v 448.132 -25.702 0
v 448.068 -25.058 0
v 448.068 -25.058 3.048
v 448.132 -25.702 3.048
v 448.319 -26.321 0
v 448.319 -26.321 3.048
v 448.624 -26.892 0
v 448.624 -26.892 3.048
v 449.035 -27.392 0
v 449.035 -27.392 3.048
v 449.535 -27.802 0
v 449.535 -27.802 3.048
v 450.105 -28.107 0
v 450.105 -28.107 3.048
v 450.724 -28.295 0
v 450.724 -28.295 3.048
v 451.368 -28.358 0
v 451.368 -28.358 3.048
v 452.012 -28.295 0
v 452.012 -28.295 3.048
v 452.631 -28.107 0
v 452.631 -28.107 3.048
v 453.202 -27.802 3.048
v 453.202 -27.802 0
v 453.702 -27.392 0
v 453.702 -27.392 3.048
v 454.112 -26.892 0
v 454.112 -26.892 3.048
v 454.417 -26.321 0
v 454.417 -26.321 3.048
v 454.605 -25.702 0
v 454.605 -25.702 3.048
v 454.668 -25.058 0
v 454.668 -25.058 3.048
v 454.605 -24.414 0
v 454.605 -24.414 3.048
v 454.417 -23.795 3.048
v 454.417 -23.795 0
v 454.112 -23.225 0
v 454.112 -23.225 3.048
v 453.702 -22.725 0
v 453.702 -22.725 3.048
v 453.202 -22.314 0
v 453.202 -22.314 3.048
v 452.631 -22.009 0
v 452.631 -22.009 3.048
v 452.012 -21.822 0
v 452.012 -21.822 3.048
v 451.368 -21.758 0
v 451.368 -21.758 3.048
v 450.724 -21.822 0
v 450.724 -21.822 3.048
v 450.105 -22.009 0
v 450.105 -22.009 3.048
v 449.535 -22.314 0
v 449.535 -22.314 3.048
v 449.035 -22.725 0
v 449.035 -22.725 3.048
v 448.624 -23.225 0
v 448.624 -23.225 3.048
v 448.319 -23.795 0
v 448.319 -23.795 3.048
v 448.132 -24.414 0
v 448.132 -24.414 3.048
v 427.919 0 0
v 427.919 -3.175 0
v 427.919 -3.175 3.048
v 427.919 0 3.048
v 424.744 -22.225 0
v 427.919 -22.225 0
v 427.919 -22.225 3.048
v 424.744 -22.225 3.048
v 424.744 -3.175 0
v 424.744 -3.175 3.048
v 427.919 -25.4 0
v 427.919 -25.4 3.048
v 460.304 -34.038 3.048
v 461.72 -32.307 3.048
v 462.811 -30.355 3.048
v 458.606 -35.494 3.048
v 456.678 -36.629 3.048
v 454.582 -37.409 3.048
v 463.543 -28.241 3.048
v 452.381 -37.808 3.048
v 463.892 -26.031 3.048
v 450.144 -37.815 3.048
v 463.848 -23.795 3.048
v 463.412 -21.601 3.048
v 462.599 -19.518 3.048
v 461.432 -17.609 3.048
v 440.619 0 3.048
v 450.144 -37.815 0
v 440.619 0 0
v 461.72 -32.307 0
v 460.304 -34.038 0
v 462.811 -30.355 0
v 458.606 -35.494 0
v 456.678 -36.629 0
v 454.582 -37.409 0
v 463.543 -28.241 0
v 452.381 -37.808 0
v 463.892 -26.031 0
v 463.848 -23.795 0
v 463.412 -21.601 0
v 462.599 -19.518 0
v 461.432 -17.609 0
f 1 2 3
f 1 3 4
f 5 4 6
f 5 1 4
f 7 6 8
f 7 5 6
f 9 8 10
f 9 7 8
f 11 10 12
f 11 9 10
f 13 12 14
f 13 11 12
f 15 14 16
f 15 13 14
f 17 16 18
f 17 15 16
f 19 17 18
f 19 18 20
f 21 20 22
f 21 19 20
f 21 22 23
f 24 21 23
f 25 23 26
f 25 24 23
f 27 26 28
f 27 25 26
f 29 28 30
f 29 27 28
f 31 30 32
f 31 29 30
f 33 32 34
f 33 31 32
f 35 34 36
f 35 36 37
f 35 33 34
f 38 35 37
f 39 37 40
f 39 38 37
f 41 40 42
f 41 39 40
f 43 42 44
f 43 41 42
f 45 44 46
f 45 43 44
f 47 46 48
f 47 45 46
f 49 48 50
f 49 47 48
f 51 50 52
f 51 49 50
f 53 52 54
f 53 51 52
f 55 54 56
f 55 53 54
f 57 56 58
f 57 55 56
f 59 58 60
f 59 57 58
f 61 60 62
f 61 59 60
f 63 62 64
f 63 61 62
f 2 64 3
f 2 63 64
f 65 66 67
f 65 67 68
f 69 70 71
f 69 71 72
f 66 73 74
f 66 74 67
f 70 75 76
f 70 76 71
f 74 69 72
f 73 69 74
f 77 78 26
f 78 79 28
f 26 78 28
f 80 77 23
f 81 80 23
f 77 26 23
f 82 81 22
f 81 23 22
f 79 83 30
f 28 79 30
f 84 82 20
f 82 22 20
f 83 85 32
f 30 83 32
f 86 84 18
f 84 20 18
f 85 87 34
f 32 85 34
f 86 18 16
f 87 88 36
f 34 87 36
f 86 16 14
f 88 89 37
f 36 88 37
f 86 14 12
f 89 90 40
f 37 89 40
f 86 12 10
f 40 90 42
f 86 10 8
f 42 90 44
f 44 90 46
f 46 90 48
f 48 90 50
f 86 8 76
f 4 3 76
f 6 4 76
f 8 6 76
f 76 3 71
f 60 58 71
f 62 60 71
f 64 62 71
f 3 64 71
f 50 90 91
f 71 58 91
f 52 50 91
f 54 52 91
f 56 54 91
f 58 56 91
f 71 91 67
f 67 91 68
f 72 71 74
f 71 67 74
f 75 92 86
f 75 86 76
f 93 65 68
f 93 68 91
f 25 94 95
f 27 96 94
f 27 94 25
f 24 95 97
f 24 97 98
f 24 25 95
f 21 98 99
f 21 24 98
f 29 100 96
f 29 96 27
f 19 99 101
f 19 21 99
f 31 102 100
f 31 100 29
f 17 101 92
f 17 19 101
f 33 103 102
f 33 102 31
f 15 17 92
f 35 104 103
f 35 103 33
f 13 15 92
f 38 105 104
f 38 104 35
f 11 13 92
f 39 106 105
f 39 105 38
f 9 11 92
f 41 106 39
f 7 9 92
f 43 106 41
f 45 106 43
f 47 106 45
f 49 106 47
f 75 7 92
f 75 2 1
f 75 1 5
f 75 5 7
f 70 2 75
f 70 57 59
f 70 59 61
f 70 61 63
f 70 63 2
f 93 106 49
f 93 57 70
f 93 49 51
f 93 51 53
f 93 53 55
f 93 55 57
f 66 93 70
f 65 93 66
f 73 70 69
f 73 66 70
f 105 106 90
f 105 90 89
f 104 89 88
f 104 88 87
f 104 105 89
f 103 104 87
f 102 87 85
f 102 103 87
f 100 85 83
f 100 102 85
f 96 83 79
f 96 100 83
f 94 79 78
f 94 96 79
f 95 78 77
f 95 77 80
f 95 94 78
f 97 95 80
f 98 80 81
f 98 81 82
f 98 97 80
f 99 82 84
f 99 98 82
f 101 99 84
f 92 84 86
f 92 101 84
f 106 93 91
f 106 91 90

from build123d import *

# Parameters (mm, degrees)
SKETCH1_R           = 3.3
BOSS_EXTRUDE1_DEPTH = 3.048


with BuildPart() as part:
    # Sketch1 → Boss-Extrude1 (new body)
    with BuildSketch(Plane.XY):
        with BuildLine():
            Line((427.919423357, 0), (440.619423357, 0))
            Line((440.619423357, 0), (461.432219063, -17.609164677))
            ThreePointArc((461.432219063, -17.609164677), (462.308947418, -31.354922495), (450.144423357, -37.815484776))
            Line((450.144423357, -37.815484776), (427.919423357, -25.4))
            Line((427.919423357, -25.4), (427.919423357, -22.225))
            Line((427.919423357, -22.225), (424.744423357, -22.225))
            Line((424.744423357, -22.225), (424.744423357, -3.175))
            Line((424.744423357, -3.175), (427.919423357, -3.175))
            Line((427.919423357, -3.175), (427.919423357, 0))
        make_face()
        with Locations(Location((451.368205009, -25.058241389, 0), (0, 0, 180))):
            Circle(SKETCH1_R, mode=Mode.SUBTRACT)
    extrude(amount=BOSS_EXTRUDE1_DEPTH)


solid = part.part
